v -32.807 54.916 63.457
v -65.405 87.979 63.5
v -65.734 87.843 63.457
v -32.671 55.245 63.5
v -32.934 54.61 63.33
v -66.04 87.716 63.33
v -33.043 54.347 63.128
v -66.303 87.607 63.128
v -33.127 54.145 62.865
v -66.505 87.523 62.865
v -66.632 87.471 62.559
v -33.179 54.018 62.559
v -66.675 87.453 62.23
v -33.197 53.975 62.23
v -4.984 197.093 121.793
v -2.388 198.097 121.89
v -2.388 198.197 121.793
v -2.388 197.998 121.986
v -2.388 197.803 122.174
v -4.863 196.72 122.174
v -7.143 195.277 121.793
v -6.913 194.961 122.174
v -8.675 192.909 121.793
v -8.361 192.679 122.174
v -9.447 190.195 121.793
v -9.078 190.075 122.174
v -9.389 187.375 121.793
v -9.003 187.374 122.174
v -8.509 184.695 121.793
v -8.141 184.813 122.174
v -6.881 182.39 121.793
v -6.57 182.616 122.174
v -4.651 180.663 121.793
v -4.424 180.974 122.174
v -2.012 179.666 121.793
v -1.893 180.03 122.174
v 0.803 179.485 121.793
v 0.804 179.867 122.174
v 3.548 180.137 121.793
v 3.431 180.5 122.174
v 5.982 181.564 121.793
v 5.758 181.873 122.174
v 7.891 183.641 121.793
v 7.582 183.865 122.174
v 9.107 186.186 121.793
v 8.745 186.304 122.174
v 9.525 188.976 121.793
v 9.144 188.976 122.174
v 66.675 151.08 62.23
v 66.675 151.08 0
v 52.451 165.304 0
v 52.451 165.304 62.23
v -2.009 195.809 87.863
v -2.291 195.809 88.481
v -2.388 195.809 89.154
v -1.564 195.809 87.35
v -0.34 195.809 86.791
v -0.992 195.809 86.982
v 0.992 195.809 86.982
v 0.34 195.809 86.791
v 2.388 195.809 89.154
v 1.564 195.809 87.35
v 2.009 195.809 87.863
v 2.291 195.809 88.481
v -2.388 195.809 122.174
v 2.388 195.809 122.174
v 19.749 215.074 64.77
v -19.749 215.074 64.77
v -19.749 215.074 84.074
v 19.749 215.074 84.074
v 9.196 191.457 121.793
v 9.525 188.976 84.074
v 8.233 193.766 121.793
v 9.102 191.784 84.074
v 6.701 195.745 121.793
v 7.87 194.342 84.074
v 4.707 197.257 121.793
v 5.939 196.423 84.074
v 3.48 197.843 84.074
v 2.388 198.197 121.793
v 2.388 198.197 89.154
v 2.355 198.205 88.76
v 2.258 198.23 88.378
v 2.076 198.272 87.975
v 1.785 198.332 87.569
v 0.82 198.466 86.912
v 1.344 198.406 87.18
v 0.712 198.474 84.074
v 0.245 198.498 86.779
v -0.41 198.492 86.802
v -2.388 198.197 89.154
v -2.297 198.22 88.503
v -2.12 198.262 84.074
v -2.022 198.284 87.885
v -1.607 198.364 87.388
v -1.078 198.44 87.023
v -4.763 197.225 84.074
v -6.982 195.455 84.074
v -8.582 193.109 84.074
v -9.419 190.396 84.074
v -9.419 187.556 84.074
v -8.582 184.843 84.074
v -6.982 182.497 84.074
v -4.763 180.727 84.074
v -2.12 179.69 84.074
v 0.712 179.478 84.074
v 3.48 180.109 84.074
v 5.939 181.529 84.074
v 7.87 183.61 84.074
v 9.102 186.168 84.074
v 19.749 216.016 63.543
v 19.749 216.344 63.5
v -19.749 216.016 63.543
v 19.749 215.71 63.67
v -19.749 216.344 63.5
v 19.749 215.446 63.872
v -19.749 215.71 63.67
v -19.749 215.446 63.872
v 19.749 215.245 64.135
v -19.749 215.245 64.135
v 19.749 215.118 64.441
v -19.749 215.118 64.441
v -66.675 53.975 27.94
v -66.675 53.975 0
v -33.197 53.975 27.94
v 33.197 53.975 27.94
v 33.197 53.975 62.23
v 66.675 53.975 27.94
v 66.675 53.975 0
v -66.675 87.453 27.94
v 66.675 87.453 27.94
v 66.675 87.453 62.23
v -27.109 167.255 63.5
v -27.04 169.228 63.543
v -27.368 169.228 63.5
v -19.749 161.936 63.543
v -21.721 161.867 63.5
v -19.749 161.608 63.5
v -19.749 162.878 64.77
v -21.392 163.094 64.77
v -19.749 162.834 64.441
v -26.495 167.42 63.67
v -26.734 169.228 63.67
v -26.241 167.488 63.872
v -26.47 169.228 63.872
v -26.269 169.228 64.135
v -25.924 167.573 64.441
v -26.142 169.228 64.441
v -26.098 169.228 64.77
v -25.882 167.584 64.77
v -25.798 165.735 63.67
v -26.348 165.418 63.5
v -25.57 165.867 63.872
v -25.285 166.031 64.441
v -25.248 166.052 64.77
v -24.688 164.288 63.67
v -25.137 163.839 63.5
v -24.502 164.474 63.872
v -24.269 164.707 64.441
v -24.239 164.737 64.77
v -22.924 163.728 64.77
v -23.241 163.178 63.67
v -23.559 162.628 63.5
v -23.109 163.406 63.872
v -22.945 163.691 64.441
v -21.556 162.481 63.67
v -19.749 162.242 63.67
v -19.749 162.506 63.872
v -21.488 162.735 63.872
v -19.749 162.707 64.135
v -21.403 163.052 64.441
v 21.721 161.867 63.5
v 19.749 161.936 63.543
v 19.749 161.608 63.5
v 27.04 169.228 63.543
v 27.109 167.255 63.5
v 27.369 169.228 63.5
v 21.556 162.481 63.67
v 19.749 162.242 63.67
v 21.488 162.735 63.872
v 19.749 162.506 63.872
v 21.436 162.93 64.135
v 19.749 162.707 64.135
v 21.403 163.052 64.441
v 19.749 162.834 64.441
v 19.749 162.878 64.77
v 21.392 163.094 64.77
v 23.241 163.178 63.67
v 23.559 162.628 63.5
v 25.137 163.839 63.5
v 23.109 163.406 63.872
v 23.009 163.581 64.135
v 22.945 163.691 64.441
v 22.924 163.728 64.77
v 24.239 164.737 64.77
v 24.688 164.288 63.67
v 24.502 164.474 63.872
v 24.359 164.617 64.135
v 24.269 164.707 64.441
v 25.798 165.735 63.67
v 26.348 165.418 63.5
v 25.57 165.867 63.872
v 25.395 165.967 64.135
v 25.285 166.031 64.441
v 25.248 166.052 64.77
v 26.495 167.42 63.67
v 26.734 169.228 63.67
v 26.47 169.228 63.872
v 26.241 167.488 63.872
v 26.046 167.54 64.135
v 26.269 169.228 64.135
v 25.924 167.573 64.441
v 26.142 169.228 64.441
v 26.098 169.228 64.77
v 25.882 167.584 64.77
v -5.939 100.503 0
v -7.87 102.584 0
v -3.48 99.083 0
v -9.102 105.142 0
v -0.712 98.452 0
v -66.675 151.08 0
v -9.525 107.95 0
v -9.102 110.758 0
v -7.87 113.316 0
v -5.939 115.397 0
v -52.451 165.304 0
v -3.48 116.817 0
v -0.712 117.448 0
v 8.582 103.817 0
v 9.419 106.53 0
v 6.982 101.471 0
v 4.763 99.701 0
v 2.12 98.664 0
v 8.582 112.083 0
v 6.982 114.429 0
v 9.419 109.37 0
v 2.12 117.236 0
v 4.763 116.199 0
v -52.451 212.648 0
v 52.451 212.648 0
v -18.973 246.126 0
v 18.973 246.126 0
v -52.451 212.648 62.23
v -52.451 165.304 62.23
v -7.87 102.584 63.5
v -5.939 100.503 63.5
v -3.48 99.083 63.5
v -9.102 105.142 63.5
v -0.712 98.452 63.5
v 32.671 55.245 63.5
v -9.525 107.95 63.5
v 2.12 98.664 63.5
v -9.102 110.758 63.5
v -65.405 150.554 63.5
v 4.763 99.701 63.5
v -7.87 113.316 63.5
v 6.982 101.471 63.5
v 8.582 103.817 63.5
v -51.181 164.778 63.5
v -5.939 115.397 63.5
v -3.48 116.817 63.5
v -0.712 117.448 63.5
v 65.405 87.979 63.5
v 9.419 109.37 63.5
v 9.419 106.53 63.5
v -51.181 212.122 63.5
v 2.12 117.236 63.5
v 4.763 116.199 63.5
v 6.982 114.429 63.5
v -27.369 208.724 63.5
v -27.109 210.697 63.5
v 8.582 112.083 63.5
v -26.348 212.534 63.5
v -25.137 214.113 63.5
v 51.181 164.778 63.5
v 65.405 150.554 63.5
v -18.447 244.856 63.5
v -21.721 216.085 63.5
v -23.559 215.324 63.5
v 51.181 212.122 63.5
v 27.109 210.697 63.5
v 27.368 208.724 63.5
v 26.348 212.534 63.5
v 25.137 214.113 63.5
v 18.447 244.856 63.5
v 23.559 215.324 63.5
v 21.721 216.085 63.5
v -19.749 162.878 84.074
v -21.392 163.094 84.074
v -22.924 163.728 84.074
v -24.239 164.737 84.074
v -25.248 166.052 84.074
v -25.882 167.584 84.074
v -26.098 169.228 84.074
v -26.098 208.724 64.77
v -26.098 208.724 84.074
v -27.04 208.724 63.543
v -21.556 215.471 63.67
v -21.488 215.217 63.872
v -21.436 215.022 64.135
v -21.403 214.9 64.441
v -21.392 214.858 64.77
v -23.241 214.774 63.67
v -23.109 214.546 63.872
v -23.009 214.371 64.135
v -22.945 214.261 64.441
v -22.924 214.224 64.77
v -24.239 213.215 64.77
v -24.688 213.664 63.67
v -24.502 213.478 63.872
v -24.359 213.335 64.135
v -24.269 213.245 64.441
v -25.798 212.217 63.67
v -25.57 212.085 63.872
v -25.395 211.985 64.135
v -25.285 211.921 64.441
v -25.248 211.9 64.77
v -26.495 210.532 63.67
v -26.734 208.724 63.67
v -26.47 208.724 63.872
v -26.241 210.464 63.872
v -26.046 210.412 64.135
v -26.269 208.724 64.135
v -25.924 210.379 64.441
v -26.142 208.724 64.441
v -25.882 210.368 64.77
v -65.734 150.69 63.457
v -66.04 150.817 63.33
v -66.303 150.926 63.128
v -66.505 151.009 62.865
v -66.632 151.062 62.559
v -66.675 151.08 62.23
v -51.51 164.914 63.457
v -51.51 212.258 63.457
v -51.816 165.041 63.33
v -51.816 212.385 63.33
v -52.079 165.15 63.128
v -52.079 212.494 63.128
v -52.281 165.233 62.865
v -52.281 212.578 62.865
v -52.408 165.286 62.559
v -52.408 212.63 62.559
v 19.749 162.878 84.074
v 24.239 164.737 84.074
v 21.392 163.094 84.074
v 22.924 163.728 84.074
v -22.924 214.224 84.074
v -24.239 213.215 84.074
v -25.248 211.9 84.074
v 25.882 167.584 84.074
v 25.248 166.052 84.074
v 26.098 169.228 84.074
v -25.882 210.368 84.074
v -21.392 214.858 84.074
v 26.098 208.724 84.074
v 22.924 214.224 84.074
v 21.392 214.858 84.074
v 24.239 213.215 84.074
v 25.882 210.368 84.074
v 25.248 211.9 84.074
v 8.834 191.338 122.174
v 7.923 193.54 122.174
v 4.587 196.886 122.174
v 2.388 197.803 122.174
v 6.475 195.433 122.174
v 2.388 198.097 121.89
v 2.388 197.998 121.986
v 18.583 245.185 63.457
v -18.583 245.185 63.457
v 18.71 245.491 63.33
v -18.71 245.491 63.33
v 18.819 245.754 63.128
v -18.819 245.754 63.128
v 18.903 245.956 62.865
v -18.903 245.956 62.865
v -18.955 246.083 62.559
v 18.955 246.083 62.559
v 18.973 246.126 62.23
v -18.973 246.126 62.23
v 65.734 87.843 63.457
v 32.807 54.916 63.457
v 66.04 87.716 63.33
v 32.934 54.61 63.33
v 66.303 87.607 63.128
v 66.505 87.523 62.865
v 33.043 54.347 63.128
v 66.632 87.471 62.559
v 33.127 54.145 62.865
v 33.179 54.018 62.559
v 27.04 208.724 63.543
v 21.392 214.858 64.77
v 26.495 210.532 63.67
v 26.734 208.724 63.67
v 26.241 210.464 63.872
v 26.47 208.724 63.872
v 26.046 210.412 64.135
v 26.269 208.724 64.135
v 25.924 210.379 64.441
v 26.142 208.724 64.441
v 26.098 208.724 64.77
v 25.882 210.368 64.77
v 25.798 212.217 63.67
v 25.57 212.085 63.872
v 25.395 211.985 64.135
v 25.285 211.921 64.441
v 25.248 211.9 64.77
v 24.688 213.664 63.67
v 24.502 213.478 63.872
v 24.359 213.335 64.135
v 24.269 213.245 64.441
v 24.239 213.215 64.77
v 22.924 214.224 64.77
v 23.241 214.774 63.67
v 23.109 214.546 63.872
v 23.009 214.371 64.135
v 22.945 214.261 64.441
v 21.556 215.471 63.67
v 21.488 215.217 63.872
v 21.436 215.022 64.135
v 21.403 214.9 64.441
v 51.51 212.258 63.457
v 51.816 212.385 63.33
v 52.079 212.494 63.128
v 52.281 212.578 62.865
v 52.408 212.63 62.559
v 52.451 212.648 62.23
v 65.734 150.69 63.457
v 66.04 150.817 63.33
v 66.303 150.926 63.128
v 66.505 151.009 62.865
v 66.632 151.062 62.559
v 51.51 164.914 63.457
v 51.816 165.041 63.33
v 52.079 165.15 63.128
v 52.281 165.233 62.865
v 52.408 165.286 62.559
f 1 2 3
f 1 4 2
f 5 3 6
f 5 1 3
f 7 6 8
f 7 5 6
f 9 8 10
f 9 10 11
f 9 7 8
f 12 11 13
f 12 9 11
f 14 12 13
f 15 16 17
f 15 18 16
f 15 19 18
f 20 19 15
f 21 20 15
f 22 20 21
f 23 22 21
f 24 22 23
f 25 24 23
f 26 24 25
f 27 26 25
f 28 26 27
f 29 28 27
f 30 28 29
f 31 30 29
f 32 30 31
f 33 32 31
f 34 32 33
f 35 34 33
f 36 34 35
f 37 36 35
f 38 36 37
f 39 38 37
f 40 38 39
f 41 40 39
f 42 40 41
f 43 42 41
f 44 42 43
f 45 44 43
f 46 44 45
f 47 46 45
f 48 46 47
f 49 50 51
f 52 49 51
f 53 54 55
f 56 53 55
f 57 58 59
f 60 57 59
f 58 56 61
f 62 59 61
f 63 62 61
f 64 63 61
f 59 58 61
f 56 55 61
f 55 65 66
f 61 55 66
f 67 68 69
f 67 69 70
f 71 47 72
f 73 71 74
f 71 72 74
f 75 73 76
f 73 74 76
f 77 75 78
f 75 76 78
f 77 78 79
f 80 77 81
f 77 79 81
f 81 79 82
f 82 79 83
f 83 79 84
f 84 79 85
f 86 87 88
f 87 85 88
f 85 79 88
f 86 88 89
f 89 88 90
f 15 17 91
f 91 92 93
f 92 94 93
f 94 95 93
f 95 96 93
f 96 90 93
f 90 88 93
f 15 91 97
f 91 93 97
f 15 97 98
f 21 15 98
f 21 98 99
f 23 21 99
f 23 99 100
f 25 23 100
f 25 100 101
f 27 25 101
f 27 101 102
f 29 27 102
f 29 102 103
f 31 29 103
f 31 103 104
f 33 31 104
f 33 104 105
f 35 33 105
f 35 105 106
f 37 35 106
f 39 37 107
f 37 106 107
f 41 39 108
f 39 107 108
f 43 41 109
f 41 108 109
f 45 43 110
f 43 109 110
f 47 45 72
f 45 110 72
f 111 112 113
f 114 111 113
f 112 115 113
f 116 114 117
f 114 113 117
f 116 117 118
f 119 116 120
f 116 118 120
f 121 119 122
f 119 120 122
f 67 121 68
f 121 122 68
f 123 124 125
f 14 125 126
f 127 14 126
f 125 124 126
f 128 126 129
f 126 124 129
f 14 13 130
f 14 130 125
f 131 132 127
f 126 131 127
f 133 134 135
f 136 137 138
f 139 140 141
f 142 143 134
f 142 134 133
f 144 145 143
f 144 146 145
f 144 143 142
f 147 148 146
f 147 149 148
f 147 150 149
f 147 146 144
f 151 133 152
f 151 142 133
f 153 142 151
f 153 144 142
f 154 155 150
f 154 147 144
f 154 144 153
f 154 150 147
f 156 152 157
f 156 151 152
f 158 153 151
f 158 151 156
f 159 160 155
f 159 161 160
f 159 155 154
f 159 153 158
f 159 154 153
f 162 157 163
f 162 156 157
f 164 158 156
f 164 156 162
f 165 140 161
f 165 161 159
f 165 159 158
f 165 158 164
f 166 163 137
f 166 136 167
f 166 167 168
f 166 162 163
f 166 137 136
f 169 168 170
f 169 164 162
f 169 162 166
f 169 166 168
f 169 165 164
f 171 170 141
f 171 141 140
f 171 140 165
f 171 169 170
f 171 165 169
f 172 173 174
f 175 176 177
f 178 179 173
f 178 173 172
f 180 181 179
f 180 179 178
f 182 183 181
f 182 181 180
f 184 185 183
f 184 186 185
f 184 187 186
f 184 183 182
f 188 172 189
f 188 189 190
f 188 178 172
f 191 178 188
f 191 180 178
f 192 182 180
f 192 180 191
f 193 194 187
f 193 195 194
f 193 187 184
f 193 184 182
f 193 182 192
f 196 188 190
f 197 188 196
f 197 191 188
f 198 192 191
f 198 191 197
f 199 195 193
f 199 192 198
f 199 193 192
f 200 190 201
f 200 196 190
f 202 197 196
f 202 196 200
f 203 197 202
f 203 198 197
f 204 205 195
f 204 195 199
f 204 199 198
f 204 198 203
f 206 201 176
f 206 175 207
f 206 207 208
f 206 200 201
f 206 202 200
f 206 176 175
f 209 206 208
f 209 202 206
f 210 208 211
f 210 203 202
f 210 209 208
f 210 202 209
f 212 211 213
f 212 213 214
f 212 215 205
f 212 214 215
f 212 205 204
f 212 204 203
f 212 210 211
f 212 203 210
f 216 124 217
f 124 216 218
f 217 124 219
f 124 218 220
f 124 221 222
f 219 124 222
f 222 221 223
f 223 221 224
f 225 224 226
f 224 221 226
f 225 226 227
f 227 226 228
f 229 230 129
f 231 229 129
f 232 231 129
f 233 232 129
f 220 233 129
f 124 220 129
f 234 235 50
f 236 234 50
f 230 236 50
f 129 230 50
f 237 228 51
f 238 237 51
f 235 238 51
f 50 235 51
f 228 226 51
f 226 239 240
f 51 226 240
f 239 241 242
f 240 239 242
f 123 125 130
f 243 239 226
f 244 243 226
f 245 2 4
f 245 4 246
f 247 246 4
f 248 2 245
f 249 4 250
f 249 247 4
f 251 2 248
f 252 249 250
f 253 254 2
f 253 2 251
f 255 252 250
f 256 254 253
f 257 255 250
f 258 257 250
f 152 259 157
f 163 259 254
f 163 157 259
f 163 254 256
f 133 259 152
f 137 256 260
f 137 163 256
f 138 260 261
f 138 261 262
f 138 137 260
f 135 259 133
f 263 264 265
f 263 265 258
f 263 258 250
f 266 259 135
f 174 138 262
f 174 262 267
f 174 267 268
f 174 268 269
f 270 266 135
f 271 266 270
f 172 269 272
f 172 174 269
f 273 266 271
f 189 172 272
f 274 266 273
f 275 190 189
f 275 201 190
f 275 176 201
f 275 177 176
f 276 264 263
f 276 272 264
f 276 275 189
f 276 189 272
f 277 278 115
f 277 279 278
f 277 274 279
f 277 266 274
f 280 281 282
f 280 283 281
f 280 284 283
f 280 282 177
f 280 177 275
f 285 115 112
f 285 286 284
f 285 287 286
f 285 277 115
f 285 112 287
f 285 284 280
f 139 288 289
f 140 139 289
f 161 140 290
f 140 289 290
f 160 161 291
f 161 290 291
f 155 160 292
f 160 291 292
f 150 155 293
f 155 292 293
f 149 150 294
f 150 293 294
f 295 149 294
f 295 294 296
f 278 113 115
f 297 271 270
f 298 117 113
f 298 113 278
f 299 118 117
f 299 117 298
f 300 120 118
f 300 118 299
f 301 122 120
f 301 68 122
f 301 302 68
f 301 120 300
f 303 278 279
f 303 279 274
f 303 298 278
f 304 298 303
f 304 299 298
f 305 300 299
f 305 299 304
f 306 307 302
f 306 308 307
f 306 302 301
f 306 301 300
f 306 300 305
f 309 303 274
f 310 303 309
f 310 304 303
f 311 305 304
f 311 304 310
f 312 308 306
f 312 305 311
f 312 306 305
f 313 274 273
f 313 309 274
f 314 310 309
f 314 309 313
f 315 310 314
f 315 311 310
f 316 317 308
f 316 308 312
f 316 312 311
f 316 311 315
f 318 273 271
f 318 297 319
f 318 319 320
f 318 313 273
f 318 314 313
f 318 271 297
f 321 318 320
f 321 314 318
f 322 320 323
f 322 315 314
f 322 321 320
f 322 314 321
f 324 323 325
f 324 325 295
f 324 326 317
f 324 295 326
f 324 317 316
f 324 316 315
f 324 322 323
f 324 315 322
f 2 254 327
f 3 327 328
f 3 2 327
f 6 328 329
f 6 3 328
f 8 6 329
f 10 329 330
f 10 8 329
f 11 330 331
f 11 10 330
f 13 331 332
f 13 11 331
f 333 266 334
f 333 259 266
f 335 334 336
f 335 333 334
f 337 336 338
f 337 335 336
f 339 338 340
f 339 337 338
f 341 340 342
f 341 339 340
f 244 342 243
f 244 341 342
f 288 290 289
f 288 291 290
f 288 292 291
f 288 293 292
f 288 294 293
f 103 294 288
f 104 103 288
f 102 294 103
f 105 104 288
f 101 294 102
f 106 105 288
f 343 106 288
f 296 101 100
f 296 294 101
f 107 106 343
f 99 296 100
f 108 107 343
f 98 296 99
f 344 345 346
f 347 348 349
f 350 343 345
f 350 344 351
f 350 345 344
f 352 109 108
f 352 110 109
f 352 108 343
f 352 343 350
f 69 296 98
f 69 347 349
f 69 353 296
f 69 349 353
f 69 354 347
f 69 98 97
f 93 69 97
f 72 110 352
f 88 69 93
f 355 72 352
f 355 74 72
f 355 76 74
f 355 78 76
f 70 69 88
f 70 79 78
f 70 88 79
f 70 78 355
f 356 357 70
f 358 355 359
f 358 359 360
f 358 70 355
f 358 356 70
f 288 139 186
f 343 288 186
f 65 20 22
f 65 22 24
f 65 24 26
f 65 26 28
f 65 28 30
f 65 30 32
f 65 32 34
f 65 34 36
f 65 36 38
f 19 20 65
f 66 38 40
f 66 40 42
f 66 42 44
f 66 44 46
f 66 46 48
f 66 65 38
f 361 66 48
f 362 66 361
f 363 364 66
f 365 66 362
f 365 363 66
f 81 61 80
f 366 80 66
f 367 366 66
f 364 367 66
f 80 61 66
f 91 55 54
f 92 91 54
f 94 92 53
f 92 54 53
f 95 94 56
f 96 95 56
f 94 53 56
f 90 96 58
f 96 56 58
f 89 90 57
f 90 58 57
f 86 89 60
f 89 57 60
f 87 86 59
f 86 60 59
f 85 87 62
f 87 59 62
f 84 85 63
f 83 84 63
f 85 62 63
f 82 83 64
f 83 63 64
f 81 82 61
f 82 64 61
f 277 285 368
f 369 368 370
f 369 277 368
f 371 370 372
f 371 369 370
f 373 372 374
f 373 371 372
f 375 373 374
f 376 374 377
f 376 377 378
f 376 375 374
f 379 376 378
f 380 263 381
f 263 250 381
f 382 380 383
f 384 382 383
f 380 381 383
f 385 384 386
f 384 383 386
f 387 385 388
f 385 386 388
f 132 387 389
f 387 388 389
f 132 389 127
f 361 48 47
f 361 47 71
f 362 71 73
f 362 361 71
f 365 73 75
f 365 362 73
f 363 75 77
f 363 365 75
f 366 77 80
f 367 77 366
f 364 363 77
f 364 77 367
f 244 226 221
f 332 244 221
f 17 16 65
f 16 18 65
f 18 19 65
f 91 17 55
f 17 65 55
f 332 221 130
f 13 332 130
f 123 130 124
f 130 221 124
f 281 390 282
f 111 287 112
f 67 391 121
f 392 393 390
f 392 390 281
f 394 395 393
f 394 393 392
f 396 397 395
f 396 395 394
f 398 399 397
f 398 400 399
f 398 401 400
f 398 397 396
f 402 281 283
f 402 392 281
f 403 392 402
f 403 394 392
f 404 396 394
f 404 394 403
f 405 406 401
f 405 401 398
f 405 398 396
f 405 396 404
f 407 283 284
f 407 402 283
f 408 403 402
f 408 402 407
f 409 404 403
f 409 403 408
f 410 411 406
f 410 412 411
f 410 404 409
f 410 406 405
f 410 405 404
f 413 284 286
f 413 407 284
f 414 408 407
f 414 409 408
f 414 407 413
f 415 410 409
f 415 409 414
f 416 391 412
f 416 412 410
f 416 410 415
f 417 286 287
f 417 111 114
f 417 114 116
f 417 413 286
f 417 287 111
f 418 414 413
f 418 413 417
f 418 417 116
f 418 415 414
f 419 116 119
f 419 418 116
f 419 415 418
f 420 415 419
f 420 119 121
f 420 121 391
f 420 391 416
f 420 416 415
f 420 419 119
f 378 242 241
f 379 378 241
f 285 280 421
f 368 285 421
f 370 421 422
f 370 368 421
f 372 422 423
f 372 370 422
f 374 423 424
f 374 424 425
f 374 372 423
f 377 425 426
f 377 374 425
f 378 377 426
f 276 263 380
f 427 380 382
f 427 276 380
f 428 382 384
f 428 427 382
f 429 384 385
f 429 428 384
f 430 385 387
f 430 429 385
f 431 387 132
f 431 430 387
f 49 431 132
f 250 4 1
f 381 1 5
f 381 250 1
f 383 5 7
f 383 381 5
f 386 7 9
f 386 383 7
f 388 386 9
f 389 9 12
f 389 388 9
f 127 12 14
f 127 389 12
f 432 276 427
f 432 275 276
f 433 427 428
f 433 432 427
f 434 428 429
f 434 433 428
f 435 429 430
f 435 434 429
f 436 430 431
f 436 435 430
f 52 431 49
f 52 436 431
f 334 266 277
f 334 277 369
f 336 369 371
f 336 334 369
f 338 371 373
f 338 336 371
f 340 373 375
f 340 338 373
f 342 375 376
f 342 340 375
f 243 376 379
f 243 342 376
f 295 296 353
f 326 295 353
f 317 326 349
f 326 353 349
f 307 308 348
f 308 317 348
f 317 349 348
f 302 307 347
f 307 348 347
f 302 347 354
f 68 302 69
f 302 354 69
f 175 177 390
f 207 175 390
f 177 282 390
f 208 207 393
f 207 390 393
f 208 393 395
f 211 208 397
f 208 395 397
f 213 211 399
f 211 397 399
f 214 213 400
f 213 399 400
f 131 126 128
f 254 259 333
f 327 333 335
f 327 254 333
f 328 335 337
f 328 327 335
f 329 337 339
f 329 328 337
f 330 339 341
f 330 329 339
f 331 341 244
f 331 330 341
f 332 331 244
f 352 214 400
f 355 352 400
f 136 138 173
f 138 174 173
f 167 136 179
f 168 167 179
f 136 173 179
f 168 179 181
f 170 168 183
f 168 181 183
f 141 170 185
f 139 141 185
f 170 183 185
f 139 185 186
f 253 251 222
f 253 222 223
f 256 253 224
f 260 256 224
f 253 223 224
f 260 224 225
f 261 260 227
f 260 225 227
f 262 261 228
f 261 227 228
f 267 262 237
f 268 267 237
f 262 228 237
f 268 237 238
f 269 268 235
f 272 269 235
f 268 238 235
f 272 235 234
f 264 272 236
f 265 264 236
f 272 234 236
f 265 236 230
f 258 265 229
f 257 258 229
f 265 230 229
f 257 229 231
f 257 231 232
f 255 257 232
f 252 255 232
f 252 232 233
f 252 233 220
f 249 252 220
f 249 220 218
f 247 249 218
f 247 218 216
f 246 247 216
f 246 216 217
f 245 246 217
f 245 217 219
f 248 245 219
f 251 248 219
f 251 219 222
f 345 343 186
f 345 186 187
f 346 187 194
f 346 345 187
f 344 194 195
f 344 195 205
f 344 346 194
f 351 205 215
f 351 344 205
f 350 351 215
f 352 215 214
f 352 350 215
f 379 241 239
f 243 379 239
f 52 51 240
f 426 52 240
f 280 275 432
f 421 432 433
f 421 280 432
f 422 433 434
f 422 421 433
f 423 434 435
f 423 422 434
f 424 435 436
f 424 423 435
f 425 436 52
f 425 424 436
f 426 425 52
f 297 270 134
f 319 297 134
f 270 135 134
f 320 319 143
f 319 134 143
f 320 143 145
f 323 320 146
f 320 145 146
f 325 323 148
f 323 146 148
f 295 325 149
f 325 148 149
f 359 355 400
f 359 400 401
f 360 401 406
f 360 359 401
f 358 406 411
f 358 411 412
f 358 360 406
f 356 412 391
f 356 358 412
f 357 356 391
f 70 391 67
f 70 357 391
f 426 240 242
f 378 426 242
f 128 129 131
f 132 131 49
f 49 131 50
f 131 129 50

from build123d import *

# Parameters (mm, degrees)
BOSS_EXTRUDE1_DEPTH = 63.5
SKETCH3_W           = 52.197
SKETCH3_H           = 52.197
BOSS_EXTRUDE2_DEPTH = 20.574
SKETCH_D_R          = 9.525
BOSS_EXTRUDE3_DEPTH = 38.1
CUT_EXTRUDE1_DEPTH  = 35.56
FILLET1_R           = 6.35
FILLET2_R           = 1.27
KEYWAY_START        = 6.8326
KEYWAY_DEPTH        = 51.3174
CHAMFER1_SIZE       = 0.381
SKETCH7_R           = 9.525
CUT_EXTRUDE3_DEPTH  = 123.174


with BuildPart() as part:
    # L,M → Boss-Extrude1 (new body)
    with BuildSketch(Plane.XY):
        Polygon((-66.675, 53.975), (66.675, 53.975), (66.675, 151.07969491), (52.451, 165.30369491), (52.451, 212.64830509), (18.97330509, 246.126), (-18.97330509, 246.126), (-52.451, 212.64830509), (-52.451, 165.30369491), (-66.675, 151.07969491), align=None)
    extrude(amount=BOSS_EXTRUDE1_DEPTH)

    # Sketch3 → Boss-Extrude2 (add)
    with BuildSketch(Plane.XY.offset(63.5)):
        with Locations((0, 188.976)):
            Rectangle(SKETCH3_W, SKETCH3_H)
    extrude(amount=BOSS_EXTRUDE2_DEPTH)

    # D → Boss-Extrude3 (add)
    with BuildSketch(Plane.XY.offset(84.074)):
        with Locations((0, 188.976)):
            Circle(SKETCH_D_R)
    extrude(amount=BOSS_EXTRUDE3_DEPTH)

    # Sketch5 → Cut-Extrude1 (cut)
    with BuildSketch(Plane.XY.offset(63.5)):
        Polygon((66.675, 87.45269491), (33.19730509, 53.975), (66.675, 53.975), align=None)
        Polygon((-66.675, 53.975), (-66.675, 87.45269491), (-33.19730509, 53.975), align=None)
    extrude(amount=-CUT_EXTRUDE1_DEPTH, mode=Mode.SUBTRACT)

    # Fillet1
    fillet1_edges = [part.edges().sort_by_distance(p)[0] for p in [
        (-26.0985, 215.0745, 73.787),
        (-26.0985, 162.8775, 73.787),
        (26.0985, 162.8775, 73.787),
        (26.0985, 215.0745, 73.787),
    ]]
    fillet(fillet1_edges, radius=FILLET1_R)

    # Fillet2
    fillet2_edges = [part.edges().sort_by_distance(p)[0] for p in [
        (66.675, 119.26619491, 63.5),
        (49.936152545, 70.713847455, 63.5),
        (59.563, 158.19169491, 63.5),
        (52.451, 188.976, 63.5),
        (35.712152545, 229.387152545, 63.5),
        (0, 53.975, 63.5),
        (0, 246.126, 63.5),
        (-35.712152545, 229.387152545, 63.5),
        (-52.451, 188.976, 63.5),
        (-59.563, 158.19169491, 63.5),
        (-66.675, 119.26619491, 63.5),
        (-49.936152545, 70.713847455, 63.5),
        (0, 162.8775, 63.5),
        (-26.0985, 188.976, 63.5),
        (26.0985, 188.976, 63.5),
        (0, 215.0745, 63.5),
        (-24.238628061, 164.737371939, 63.5),
        (24.238628061, 164.737371939, 63.5),
        (-24.238628061, 213.214628061, 63.5),
        (24.238628061, 213.214628061, 63.5),
    ]]
    fillet(fillet2_edges, radius=FILLET2_R)

    # Sketch6 → Keyway (cut, through all)
    with BuildSketch(Plane(origin=(0, 188.976, 0), x_dir=(-1, 0, 0), z_dir=(0, 1, 0)).offset(KEYWAY_START)):
        with BuildLine():
            Line((2.3876, 122.174), (2.3876, 89.154))
            ThreePointArc((2.3876, 89.154), (0, 86.7664), (-2.3876, 89.154))
            Line((-2.3876, 89.154), (-2.3876, 122.174))
            ThreePointArc((-2.3876, 122.174), (0, 124.5616), (2.3876, 122.174))
        make_face()
    extrude(amount=KEYWAY_DEPTH, mode=Mode.SUBTRACT)

    # Chamfer1
    chamfer1_edges = [part.edges().sort_by_distance(p)[0] for p in [
        (-5.830254497, 181.443818543, 122.174),
    ]]
    chamfer(chamfer1_edges, length=CHAMFER1_SIZE)

    # Sketch7 → Cut-Extrude3 (cut, through all)
    with BuildSketch(Plane(origin=(0, 0, 0), x_dir=(-1, 0, 0), z_dir=(0, 0, -1))):
        with Locations((0, 107.95)):
            Circle(SKETCH7_R)
    extrude(amount=-CUT_EXTRUDE3_DEPTH, mode=Mode.SUBTRACT)


solid = part.part
